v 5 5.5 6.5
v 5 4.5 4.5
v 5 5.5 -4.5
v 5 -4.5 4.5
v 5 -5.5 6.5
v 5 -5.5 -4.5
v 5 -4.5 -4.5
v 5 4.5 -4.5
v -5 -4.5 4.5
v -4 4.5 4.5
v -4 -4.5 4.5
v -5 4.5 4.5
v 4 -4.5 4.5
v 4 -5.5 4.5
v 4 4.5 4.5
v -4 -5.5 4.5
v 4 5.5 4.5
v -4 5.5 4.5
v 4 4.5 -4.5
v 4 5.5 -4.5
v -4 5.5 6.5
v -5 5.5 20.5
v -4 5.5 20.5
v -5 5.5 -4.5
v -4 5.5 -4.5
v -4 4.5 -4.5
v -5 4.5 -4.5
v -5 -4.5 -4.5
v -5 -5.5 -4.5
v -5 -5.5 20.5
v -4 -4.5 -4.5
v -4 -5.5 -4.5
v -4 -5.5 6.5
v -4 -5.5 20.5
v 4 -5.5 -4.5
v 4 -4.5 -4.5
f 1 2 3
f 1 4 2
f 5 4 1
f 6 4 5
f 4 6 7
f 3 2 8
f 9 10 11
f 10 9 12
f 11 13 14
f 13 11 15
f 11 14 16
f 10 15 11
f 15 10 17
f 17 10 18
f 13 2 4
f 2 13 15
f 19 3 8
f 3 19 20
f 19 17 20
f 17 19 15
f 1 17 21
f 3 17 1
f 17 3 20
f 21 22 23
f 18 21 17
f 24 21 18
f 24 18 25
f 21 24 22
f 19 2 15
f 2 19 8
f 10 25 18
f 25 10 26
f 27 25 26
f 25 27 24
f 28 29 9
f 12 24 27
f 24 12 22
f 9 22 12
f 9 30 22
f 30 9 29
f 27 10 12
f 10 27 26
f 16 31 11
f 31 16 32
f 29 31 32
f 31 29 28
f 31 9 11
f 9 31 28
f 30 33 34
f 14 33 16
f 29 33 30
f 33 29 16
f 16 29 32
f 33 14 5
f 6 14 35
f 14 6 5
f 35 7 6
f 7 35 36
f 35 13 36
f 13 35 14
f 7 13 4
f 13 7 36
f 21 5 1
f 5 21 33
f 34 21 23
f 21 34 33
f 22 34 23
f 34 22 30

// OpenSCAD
// Modify Input DATA to change the shape of the chair

module Chair_01(){

    // INPUT DATA

    Table_Leg = [1,1,9];      // lenght, width and height of legs
    Table_Top_Height = 2;     //  Height of theSeat

    Leg_Distance_x = 9;        
    Leg_Distance_y = 10;     

    seat_height = 14;         // Backpost size 
    seat_width = 1;           // Backpost width (x axis)


    // OUTPUT DATA

    translate([Leg_Distance_x*0.5,Leg_Distance_y*0.5,0])
    color("PowderBlue")
    cube([Table_Leg[0],Table_Leg[1],Table_Leg[2]],center=true);

    translate([-Leg_Distance_x*0.5,Leg_Distance_y*0.5,0])
    color("PowderBlue")
    cube([Table_Leg[0],Table_Leg[1],Table_Leg[2]],center=true);

    translate([-Leg_Distance_x*0.5,-Leg_Distance_y*0.5,0])
    color("PowderBlue")
    cube([Table_Leg[0],Table_Leg[1],Table_Leg[2]],center=true);

    translate([Leg_Distance_x*0.5,-Leg_Distance_y*0.5,0])
    color("PowderBlue")
    cube([Table_Leg[0],Table_Leg[1],Table_Leg[2]],center=true);

    Table_Upper = [Leg_Distance_x + Table_Leg[0],Leg_Distance_y +Table_Leg[1],Table_Top_Height];

    seat = [seat_width,Leg_Distance_y+Table_Leg[1],seat_height];

    translate([0,0,Table_Leg[2]*0.5+Table_Top_Height*0.5])
    color("PowderBlue")
    cube([Table_Upper[0],Table_Upper[1],Table_Upper[2]],center=true);

    translate([-Table_Upper[0]*0.5+seat[0]*0.5,0,Table_Leg[2]*0.5+Table_Top_Height+seat_height*0.5])
    color("YellowGreen")
    cube([seat[0],seat[1],seat[2]],center=true);

}

Chair_01();


// Written by Nicolì Angelo (Gengio) 2024: 
// MIT License

//Permission is hereby granted, free of charge, to any person obtaining a copy of this software and associated documentation files (the "Software"), to deal in the Software without restriction, including without limitation the rights to use, copy, modify, merge, publish, distribute, sublicense, and/or sell copies of the Software, and to permit persons to whom the Software is furnished to do so, subject to the following conditions:

//The above copyright notice and this permission notice shall be included in all copies or substantial portions of the Software.

//THE SOFTWARE IS PROVIDED "AS IS", WITHOUT WARRANTY OF ANY KIND, EXPRESS OR IMPLIED, INCLUDING BUT NOT LIMITED TO THE WARRANTIES OF MERCHANTABILITY, FITNESS FOR A PARTICULAR PURPOSE AND NONINFRINGEMENT. IN NO EVENT SHALL THE AUTHORS OR COPYRIGHT HOLDERS BE LIABLE FOR ANY CLAIM, DAMAGES OR OTHER LIABILITY, WHETHER IN AN ACTION OF CONTRACT, TORT OR OTHERWISE, ARISING FROM, OUT OF OR IN CONNECTION WITH THE SOFTWARE OR THE USE OR OTHER DEALINGS IN THE SOFTWARE.
